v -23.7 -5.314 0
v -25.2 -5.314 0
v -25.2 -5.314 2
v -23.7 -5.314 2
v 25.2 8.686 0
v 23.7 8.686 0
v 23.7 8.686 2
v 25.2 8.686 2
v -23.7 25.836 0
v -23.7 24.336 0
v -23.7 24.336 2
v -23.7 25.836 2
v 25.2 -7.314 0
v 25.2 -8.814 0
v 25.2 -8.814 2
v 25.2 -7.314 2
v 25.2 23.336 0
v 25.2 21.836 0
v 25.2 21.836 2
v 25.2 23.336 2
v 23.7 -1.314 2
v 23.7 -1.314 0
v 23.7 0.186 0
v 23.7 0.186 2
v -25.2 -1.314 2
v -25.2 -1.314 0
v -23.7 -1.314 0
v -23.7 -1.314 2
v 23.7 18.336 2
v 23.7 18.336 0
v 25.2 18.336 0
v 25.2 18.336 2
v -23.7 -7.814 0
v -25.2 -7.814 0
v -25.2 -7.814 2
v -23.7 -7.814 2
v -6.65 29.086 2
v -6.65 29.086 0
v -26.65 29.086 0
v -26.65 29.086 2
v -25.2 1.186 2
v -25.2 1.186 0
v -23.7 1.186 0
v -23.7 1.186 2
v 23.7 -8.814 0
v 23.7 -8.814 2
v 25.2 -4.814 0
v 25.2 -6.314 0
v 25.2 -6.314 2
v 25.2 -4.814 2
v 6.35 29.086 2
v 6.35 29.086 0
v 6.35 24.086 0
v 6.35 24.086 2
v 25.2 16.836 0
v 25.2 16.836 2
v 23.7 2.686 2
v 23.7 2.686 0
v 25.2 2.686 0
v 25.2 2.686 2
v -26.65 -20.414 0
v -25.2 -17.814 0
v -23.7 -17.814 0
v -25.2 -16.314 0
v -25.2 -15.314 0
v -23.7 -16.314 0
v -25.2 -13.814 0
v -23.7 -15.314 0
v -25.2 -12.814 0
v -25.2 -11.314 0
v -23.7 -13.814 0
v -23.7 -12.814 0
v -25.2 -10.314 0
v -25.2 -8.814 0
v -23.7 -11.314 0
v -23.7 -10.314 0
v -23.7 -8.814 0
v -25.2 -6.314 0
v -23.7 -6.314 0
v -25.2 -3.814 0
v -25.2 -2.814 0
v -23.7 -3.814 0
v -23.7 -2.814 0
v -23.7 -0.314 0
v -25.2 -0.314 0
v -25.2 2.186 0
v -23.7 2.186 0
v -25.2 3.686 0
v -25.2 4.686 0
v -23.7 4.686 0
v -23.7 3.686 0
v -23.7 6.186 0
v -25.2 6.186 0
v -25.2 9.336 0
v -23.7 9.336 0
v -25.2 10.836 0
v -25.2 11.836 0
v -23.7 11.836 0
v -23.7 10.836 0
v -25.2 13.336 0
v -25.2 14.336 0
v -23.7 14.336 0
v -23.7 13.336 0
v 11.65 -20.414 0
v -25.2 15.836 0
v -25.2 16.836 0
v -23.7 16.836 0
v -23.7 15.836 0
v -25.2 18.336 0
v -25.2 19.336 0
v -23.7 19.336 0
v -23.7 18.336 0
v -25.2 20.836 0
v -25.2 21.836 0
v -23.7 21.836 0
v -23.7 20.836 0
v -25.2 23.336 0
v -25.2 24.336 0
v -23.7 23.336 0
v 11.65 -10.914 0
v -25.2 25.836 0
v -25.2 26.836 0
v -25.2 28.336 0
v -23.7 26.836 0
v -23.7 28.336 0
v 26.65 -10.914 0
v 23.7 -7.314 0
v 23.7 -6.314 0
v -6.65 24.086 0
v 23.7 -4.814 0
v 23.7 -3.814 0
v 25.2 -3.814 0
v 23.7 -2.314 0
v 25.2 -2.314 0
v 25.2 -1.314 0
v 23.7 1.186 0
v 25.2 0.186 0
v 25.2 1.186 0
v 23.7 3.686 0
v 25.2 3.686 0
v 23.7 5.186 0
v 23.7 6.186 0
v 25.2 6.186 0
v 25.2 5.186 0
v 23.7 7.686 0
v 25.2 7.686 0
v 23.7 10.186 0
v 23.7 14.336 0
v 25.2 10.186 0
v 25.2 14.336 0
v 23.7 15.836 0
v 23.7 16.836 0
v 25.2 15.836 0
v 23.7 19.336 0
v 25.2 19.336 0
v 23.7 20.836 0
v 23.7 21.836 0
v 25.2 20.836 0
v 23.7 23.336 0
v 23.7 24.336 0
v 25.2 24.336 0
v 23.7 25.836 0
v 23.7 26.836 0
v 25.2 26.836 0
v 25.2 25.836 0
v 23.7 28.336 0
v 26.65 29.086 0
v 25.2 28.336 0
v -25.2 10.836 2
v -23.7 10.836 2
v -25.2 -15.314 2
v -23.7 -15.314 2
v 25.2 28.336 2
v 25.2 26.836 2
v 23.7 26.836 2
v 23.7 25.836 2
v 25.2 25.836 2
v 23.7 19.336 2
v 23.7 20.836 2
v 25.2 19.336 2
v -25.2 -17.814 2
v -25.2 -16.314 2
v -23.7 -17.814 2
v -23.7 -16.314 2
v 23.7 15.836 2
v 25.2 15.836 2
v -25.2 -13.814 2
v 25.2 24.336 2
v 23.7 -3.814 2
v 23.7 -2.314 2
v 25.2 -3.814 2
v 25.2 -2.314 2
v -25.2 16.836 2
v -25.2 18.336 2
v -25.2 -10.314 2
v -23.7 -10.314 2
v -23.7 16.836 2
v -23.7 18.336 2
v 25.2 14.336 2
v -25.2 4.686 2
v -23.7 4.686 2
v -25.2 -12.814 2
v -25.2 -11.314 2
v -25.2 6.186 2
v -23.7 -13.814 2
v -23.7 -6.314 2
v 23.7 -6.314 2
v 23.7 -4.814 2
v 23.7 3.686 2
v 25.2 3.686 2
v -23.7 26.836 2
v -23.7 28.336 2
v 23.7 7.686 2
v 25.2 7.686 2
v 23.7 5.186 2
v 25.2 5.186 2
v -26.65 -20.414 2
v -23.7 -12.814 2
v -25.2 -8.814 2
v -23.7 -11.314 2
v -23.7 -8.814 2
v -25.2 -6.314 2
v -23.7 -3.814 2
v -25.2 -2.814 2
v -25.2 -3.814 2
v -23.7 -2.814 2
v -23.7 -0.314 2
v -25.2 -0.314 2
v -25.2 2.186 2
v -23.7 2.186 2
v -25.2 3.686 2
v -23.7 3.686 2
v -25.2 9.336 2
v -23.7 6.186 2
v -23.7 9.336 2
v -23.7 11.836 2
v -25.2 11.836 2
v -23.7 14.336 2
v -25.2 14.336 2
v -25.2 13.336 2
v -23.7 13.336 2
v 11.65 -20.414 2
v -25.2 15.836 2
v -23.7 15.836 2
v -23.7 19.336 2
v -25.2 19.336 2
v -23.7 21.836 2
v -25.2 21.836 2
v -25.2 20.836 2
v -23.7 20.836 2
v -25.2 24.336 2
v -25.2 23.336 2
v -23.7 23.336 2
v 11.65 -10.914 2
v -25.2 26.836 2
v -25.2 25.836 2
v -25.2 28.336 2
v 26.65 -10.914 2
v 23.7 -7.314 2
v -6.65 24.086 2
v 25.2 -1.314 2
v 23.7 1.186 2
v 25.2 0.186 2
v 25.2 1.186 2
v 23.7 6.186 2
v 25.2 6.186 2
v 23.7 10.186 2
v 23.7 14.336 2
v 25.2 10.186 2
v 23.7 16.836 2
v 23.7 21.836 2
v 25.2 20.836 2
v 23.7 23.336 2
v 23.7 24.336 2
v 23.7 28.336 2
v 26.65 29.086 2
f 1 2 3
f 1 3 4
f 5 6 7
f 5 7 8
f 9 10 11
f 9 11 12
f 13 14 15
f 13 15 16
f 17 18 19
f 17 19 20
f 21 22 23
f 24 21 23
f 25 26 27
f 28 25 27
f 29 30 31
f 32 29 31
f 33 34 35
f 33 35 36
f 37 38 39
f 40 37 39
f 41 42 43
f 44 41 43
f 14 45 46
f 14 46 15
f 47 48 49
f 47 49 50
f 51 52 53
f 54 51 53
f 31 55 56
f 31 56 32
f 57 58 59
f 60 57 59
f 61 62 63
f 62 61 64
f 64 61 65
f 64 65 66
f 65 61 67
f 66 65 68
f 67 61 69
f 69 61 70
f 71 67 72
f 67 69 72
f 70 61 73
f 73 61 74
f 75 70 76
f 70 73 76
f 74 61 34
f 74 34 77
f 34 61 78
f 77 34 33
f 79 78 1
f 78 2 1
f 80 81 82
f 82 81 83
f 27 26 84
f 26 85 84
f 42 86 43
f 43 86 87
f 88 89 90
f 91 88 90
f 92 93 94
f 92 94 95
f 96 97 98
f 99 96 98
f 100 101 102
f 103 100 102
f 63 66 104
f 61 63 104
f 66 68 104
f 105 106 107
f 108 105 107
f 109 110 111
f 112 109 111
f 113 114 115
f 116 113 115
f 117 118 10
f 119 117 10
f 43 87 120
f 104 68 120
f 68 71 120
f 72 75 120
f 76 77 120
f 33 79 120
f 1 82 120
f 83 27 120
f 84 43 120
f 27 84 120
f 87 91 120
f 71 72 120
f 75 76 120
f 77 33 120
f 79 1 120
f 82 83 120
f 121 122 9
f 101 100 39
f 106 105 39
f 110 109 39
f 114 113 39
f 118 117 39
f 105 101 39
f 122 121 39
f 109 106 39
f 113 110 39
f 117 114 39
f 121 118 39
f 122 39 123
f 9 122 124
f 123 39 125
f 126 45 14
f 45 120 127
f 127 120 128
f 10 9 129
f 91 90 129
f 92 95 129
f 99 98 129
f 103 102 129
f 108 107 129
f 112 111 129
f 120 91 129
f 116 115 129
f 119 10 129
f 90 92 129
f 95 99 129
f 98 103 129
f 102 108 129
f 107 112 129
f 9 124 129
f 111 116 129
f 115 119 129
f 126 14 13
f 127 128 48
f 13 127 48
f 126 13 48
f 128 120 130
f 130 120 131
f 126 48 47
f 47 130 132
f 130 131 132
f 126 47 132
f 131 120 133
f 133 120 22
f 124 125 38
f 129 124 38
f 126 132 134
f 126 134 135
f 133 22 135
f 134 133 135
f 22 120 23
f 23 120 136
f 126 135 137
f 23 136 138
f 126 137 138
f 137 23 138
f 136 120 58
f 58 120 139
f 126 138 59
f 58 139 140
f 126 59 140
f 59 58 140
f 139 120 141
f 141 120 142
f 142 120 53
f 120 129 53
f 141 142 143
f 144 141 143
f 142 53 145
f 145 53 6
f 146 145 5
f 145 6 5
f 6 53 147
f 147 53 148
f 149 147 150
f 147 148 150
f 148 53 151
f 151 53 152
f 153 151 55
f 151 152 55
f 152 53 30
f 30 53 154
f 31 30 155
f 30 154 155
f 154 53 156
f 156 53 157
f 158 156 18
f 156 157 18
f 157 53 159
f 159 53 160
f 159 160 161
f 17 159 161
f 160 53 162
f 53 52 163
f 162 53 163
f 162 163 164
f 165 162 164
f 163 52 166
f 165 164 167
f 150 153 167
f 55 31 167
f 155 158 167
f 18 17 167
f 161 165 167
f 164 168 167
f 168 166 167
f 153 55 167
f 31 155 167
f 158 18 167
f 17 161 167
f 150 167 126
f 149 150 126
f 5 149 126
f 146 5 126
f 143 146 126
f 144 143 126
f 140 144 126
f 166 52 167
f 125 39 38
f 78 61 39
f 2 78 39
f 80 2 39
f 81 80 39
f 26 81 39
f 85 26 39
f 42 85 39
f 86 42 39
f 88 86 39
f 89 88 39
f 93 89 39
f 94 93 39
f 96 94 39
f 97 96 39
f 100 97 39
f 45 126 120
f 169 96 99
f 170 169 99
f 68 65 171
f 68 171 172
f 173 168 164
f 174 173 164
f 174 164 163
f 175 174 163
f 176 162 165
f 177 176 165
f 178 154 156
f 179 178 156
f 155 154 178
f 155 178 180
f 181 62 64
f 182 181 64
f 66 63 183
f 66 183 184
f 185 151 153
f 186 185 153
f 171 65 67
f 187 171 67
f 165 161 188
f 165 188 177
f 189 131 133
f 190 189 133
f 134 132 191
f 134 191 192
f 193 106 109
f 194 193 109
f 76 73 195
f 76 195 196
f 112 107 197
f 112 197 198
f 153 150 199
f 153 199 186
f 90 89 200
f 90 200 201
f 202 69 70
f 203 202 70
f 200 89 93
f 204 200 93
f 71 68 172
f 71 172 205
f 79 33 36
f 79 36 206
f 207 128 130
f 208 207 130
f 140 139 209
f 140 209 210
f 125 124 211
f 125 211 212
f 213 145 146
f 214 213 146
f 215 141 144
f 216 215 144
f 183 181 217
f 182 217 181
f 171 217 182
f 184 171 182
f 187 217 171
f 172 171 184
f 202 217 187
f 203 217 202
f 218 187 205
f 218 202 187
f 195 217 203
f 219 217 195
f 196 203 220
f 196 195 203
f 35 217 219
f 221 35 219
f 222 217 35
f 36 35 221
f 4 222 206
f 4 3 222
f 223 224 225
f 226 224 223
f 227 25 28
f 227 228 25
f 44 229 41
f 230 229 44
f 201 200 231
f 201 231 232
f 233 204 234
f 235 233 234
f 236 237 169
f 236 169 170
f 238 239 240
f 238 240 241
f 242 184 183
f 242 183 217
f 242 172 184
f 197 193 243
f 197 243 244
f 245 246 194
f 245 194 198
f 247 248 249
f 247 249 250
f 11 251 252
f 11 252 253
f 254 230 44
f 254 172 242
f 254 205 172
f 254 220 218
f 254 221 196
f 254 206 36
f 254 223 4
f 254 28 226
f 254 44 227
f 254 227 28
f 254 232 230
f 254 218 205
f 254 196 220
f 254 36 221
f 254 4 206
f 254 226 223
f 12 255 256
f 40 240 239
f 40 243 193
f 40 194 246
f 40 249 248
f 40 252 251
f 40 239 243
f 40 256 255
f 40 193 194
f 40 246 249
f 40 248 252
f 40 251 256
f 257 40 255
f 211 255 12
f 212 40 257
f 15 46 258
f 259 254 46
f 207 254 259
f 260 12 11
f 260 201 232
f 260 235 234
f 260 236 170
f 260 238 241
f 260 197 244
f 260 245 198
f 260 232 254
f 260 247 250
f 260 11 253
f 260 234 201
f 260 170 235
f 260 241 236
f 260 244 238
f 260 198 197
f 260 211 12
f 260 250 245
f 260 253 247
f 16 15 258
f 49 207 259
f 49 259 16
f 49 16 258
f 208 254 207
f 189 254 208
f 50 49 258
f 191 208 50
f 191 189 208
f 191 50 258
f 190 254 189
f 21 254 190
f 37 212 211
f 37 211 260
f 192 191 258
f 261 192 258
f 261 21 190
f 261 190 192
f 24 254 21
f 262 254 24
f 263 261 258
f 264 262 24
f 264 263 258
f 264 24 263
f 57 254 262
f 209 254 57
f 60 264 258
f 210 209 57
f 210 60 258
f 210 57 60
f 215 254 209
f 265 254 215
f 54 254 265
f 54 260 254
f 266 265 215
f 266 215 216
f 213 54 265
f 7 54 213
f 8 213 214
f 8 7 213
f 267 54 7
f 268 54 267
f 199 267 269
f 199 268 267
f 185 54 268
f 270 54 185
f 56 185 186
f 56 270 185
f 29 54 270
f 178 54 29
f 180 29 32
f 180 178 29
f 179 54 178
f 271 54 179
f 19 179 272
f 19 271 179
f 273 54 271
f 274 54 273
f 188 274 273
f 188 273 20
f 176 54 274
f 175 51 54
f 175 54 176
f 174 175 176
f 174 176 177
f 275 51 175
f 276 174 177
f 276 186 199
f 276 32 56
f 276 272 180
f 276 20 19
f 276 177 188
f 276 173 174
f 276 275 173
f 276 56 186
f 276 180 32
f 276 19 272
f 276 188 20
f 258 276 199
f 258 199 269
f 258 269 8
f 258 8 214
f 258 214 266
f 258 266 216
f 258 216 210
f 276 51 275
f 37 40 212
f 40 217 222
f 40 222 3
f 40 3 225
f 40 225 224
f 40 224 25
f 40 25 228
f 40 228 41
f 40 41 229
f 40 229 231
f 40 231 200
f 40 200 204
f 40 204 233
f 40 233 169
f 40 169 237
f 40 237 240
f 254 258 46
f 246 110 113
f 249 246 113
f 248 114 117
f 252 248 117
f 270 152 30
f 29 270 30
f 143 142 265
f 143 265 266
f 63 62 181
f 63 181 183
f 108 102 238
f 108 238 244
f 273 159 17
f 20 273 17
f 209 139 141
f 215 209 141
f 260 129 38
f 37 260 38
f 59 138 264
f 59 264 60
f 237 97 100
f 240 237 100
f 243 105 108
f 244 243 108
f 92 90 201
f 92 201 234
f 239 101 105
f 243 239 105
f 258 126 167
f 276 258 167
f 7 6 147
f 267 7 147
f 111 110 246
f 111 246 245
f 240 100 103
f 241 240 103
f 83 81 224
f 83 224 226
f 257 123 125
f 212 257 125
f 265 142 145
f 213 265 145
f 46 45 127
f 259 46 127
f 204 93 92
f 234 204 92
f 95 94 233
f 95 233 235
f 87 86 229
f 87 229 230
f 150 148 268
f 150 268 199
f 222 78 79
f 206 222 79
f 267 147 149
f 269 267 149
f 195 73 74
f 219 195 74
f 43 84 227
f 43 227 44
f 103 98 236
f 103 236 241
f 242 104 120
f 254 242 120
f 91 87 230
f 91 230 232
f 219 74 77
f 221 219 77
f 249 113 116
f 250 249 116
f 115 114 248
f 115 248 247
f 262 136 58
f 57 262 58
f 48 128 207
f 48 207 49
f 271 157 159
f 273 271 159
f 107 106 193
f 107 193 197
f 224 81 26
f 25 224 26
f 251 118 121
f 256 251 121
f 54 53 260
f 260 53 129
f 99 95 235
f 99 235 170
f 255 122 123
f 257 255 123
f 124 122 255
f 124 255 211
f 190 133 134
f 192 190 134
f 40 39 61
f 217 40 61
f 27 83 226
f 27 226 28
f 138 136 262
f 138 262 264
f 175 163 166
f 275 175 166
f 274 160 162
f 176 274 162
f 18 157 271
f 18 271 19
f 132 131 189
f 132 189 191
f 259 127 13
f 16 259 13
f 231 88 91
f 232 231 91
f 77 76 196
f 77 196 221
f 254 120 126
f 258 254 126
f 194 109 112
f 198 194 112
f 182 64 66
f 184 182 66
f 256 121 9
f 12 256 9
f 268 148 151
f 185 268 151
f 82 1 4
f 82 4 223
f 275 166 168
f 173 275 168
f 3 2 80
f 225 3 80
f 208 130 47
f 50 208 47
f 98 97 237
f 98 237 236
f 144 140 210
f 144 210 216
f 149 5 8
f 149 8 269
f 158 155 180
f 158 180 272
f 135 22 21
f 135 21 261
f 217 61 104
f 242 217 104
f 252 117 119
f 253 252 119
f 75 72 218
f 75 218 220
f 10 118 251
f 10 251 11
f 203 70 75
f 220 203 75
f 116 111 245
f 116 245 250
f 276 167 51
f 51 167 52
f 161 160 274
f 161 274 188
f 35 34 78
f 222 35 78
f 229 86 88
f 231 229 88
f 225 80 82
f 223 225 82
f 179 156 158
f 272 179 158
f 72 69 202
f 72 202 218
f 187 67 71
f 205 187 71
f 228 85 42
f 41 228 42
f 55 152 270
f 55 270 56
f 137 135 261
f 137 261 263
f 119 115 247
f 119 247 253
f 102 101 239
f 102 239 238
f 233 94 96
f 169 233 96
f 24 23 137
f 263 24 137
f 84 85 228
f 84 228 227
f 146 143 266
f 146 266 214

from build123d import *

# Parameters (mm, degrees)
F0_W     = 1.5
F0_H     = 1.5
F1_DEPTH = 2


with BuildPart() as f1:
    # F0 (on Top) → F1 (new body)
    with BuildSketch(Plane.XY):
        Polygon((26.65, -10.914245), (26.65, 29.085755), (25.45, 29.085755), (23.45, 29.085755), (6.35, 29.085755), (6.35, 24.085755), (-6.65, 24.085755), (-6.65, 29.085755), (-23.45, 29.085755), (-25.45, 29.085755), (-26.65, 29.085755), (-26.65, -20.414245), (11.65, -20.414245), (11.65, -10.914245), align=None)
        with Locations((-24.45, -17.064245)):
            Rectangle(F0_W, F0_H, mode=Mode.SUBTRACT)
        with Locations((-24.45, -14.564245)):
            Rectangle(F0_W, F0_H, mode=Mode.SUBTRACT)
        with Locations((-24.45, -12.064245)):
            Rectangle(F0_W, F0_H, mode=Mode.SUBTRACT)
        with Locations((-24.45, -9.564245)):
            Rectangle(F0_W, F0_H, mode=Mode.SUBTRACT)
        with Locations((-24.45, -7.064245)):
            Rectangle(F0_W, F0_H, mode=Mode.SUBTRACT)
        with Locations((-24.45, -4.564245)):
            Rectangle(F0_W, F0_H, mode=Mode.SUBTRACT)
        with Locations((-24.45, -2.064245)):
            Rectangle(F0_W, F0_H, mode=Mode.SUBTRACT)
        with Locations((-24.45, 0.435755)):
            Rectangle(F0_W, F0_H, mode=Mode.SUBTRACT)
        with Locations((-24.45, 2.935755)):
            Rectangle(F0_W, F0_H, mode=Mode.SUBTRACT)
        with Locations((24.45, -8.064245)):
            Rectangle(F0_W, F0_H, mode=Mode.SUBTRACT)
        with Locations((24.45, -5.564245)):
            Rectangle(F0_W, F0_H, mode=Mode.SUBTRACT)
        with Locations((24.45, -3.064245)):
            Rectangle(F0_W, F0_H, mode=Mode.SUBTRACT)
        with Locations((24.45, -0.564245)):
            Rectangle(F0_W, F0_H, mode=Mode.SUBTRACT)
        with Locations((24.45, 1.935755)):
            Rectangle(F0_W, F0_H, mode=Mode.SUBTRACT)
        with Locations((-24.45, 5.435755)):
            Rectangle(F0_W, F0_H, mode=Mode.SUBTRACT)
        with Locations((-24.45, 10.085755)):
            Rectangle(F0_W, F0_H, mode=Mode.SUBTRACT)
        with Locations((-24.45, 12.585755)):
            Rectangle(F0_W, F0_H, mode=Mode.SUBTRACT)
        with Locations((-24.45, 15.085755)):
            Rectangle(F0_W, F0_H, mode=Mode.SUBTRACT)
        with Locations((-24.45, 17.585755)):
            Rectangle(F0_W, F0_H, mode=Mode.SUBTRACT)
        with Locations((-24.45, 20.085755)):
            Rectangle(F0_W, F0_H, mode=Mode.SUBTRACT)
        with Locations((-24.45, 22.585755)):
            Rectangle(F0_W, F0_H, mode=Mode.SUBTRACT)
        with Locations((-24.45, 25.085755)):
            Rectangle(F0_W, F0_H, mode=Mode.SUBTRACT)
        with Locations((-24.45, 27.585755)):
            Rectangle(F0_W, F0_H, mode=Mode.SUBTRACT)
        with Locations((24.45, 4.435755)):
            Rectangle(F0_W, F0_H, mode=Mode.SUBTRACT)
        with Locations((24.45, 6.935755)):
            Rectangle(F0_W, F0_H, mode=Mode.SUBTRACT)
        with Locations((24.45, 9.435755)):
            Rectangle(F0_W, F0_H, mode=Mode.SUBTRACT)
        with Locations((24.45, 15.085755)):
            Rectangle(F0_W, F0_H, mode=Mode.SUBTRACT)
        with Locations((24.45, 17.585755)):
            Rectangle(F0_W, F0_H, mode=Mode.SUBTRACT)
        with Locations((24.45, 20.085755)):
            Rectangle(F0_W, F0_H, mode=Mode.SUBTRACT)
        with Locations((24.45, 22.585755)):
            Rectangle(F0_W, F0_H, mode=Mode.SUBTRACT)
        with Locations((24.45, 25.085755)):
            Rectangle(F0_W, F0_H, mode=Mode.SUBTRACT)
        Polygon((25.2, 28.085755), (25.2, 26.835755), (23.7, 26.835755), (23.7, 28.335755), (25.2, 28.335755), align=None, mode=Mode.SUBTRACT)
    extrude(amount=F1_DEPTH)


solid = f1.part
